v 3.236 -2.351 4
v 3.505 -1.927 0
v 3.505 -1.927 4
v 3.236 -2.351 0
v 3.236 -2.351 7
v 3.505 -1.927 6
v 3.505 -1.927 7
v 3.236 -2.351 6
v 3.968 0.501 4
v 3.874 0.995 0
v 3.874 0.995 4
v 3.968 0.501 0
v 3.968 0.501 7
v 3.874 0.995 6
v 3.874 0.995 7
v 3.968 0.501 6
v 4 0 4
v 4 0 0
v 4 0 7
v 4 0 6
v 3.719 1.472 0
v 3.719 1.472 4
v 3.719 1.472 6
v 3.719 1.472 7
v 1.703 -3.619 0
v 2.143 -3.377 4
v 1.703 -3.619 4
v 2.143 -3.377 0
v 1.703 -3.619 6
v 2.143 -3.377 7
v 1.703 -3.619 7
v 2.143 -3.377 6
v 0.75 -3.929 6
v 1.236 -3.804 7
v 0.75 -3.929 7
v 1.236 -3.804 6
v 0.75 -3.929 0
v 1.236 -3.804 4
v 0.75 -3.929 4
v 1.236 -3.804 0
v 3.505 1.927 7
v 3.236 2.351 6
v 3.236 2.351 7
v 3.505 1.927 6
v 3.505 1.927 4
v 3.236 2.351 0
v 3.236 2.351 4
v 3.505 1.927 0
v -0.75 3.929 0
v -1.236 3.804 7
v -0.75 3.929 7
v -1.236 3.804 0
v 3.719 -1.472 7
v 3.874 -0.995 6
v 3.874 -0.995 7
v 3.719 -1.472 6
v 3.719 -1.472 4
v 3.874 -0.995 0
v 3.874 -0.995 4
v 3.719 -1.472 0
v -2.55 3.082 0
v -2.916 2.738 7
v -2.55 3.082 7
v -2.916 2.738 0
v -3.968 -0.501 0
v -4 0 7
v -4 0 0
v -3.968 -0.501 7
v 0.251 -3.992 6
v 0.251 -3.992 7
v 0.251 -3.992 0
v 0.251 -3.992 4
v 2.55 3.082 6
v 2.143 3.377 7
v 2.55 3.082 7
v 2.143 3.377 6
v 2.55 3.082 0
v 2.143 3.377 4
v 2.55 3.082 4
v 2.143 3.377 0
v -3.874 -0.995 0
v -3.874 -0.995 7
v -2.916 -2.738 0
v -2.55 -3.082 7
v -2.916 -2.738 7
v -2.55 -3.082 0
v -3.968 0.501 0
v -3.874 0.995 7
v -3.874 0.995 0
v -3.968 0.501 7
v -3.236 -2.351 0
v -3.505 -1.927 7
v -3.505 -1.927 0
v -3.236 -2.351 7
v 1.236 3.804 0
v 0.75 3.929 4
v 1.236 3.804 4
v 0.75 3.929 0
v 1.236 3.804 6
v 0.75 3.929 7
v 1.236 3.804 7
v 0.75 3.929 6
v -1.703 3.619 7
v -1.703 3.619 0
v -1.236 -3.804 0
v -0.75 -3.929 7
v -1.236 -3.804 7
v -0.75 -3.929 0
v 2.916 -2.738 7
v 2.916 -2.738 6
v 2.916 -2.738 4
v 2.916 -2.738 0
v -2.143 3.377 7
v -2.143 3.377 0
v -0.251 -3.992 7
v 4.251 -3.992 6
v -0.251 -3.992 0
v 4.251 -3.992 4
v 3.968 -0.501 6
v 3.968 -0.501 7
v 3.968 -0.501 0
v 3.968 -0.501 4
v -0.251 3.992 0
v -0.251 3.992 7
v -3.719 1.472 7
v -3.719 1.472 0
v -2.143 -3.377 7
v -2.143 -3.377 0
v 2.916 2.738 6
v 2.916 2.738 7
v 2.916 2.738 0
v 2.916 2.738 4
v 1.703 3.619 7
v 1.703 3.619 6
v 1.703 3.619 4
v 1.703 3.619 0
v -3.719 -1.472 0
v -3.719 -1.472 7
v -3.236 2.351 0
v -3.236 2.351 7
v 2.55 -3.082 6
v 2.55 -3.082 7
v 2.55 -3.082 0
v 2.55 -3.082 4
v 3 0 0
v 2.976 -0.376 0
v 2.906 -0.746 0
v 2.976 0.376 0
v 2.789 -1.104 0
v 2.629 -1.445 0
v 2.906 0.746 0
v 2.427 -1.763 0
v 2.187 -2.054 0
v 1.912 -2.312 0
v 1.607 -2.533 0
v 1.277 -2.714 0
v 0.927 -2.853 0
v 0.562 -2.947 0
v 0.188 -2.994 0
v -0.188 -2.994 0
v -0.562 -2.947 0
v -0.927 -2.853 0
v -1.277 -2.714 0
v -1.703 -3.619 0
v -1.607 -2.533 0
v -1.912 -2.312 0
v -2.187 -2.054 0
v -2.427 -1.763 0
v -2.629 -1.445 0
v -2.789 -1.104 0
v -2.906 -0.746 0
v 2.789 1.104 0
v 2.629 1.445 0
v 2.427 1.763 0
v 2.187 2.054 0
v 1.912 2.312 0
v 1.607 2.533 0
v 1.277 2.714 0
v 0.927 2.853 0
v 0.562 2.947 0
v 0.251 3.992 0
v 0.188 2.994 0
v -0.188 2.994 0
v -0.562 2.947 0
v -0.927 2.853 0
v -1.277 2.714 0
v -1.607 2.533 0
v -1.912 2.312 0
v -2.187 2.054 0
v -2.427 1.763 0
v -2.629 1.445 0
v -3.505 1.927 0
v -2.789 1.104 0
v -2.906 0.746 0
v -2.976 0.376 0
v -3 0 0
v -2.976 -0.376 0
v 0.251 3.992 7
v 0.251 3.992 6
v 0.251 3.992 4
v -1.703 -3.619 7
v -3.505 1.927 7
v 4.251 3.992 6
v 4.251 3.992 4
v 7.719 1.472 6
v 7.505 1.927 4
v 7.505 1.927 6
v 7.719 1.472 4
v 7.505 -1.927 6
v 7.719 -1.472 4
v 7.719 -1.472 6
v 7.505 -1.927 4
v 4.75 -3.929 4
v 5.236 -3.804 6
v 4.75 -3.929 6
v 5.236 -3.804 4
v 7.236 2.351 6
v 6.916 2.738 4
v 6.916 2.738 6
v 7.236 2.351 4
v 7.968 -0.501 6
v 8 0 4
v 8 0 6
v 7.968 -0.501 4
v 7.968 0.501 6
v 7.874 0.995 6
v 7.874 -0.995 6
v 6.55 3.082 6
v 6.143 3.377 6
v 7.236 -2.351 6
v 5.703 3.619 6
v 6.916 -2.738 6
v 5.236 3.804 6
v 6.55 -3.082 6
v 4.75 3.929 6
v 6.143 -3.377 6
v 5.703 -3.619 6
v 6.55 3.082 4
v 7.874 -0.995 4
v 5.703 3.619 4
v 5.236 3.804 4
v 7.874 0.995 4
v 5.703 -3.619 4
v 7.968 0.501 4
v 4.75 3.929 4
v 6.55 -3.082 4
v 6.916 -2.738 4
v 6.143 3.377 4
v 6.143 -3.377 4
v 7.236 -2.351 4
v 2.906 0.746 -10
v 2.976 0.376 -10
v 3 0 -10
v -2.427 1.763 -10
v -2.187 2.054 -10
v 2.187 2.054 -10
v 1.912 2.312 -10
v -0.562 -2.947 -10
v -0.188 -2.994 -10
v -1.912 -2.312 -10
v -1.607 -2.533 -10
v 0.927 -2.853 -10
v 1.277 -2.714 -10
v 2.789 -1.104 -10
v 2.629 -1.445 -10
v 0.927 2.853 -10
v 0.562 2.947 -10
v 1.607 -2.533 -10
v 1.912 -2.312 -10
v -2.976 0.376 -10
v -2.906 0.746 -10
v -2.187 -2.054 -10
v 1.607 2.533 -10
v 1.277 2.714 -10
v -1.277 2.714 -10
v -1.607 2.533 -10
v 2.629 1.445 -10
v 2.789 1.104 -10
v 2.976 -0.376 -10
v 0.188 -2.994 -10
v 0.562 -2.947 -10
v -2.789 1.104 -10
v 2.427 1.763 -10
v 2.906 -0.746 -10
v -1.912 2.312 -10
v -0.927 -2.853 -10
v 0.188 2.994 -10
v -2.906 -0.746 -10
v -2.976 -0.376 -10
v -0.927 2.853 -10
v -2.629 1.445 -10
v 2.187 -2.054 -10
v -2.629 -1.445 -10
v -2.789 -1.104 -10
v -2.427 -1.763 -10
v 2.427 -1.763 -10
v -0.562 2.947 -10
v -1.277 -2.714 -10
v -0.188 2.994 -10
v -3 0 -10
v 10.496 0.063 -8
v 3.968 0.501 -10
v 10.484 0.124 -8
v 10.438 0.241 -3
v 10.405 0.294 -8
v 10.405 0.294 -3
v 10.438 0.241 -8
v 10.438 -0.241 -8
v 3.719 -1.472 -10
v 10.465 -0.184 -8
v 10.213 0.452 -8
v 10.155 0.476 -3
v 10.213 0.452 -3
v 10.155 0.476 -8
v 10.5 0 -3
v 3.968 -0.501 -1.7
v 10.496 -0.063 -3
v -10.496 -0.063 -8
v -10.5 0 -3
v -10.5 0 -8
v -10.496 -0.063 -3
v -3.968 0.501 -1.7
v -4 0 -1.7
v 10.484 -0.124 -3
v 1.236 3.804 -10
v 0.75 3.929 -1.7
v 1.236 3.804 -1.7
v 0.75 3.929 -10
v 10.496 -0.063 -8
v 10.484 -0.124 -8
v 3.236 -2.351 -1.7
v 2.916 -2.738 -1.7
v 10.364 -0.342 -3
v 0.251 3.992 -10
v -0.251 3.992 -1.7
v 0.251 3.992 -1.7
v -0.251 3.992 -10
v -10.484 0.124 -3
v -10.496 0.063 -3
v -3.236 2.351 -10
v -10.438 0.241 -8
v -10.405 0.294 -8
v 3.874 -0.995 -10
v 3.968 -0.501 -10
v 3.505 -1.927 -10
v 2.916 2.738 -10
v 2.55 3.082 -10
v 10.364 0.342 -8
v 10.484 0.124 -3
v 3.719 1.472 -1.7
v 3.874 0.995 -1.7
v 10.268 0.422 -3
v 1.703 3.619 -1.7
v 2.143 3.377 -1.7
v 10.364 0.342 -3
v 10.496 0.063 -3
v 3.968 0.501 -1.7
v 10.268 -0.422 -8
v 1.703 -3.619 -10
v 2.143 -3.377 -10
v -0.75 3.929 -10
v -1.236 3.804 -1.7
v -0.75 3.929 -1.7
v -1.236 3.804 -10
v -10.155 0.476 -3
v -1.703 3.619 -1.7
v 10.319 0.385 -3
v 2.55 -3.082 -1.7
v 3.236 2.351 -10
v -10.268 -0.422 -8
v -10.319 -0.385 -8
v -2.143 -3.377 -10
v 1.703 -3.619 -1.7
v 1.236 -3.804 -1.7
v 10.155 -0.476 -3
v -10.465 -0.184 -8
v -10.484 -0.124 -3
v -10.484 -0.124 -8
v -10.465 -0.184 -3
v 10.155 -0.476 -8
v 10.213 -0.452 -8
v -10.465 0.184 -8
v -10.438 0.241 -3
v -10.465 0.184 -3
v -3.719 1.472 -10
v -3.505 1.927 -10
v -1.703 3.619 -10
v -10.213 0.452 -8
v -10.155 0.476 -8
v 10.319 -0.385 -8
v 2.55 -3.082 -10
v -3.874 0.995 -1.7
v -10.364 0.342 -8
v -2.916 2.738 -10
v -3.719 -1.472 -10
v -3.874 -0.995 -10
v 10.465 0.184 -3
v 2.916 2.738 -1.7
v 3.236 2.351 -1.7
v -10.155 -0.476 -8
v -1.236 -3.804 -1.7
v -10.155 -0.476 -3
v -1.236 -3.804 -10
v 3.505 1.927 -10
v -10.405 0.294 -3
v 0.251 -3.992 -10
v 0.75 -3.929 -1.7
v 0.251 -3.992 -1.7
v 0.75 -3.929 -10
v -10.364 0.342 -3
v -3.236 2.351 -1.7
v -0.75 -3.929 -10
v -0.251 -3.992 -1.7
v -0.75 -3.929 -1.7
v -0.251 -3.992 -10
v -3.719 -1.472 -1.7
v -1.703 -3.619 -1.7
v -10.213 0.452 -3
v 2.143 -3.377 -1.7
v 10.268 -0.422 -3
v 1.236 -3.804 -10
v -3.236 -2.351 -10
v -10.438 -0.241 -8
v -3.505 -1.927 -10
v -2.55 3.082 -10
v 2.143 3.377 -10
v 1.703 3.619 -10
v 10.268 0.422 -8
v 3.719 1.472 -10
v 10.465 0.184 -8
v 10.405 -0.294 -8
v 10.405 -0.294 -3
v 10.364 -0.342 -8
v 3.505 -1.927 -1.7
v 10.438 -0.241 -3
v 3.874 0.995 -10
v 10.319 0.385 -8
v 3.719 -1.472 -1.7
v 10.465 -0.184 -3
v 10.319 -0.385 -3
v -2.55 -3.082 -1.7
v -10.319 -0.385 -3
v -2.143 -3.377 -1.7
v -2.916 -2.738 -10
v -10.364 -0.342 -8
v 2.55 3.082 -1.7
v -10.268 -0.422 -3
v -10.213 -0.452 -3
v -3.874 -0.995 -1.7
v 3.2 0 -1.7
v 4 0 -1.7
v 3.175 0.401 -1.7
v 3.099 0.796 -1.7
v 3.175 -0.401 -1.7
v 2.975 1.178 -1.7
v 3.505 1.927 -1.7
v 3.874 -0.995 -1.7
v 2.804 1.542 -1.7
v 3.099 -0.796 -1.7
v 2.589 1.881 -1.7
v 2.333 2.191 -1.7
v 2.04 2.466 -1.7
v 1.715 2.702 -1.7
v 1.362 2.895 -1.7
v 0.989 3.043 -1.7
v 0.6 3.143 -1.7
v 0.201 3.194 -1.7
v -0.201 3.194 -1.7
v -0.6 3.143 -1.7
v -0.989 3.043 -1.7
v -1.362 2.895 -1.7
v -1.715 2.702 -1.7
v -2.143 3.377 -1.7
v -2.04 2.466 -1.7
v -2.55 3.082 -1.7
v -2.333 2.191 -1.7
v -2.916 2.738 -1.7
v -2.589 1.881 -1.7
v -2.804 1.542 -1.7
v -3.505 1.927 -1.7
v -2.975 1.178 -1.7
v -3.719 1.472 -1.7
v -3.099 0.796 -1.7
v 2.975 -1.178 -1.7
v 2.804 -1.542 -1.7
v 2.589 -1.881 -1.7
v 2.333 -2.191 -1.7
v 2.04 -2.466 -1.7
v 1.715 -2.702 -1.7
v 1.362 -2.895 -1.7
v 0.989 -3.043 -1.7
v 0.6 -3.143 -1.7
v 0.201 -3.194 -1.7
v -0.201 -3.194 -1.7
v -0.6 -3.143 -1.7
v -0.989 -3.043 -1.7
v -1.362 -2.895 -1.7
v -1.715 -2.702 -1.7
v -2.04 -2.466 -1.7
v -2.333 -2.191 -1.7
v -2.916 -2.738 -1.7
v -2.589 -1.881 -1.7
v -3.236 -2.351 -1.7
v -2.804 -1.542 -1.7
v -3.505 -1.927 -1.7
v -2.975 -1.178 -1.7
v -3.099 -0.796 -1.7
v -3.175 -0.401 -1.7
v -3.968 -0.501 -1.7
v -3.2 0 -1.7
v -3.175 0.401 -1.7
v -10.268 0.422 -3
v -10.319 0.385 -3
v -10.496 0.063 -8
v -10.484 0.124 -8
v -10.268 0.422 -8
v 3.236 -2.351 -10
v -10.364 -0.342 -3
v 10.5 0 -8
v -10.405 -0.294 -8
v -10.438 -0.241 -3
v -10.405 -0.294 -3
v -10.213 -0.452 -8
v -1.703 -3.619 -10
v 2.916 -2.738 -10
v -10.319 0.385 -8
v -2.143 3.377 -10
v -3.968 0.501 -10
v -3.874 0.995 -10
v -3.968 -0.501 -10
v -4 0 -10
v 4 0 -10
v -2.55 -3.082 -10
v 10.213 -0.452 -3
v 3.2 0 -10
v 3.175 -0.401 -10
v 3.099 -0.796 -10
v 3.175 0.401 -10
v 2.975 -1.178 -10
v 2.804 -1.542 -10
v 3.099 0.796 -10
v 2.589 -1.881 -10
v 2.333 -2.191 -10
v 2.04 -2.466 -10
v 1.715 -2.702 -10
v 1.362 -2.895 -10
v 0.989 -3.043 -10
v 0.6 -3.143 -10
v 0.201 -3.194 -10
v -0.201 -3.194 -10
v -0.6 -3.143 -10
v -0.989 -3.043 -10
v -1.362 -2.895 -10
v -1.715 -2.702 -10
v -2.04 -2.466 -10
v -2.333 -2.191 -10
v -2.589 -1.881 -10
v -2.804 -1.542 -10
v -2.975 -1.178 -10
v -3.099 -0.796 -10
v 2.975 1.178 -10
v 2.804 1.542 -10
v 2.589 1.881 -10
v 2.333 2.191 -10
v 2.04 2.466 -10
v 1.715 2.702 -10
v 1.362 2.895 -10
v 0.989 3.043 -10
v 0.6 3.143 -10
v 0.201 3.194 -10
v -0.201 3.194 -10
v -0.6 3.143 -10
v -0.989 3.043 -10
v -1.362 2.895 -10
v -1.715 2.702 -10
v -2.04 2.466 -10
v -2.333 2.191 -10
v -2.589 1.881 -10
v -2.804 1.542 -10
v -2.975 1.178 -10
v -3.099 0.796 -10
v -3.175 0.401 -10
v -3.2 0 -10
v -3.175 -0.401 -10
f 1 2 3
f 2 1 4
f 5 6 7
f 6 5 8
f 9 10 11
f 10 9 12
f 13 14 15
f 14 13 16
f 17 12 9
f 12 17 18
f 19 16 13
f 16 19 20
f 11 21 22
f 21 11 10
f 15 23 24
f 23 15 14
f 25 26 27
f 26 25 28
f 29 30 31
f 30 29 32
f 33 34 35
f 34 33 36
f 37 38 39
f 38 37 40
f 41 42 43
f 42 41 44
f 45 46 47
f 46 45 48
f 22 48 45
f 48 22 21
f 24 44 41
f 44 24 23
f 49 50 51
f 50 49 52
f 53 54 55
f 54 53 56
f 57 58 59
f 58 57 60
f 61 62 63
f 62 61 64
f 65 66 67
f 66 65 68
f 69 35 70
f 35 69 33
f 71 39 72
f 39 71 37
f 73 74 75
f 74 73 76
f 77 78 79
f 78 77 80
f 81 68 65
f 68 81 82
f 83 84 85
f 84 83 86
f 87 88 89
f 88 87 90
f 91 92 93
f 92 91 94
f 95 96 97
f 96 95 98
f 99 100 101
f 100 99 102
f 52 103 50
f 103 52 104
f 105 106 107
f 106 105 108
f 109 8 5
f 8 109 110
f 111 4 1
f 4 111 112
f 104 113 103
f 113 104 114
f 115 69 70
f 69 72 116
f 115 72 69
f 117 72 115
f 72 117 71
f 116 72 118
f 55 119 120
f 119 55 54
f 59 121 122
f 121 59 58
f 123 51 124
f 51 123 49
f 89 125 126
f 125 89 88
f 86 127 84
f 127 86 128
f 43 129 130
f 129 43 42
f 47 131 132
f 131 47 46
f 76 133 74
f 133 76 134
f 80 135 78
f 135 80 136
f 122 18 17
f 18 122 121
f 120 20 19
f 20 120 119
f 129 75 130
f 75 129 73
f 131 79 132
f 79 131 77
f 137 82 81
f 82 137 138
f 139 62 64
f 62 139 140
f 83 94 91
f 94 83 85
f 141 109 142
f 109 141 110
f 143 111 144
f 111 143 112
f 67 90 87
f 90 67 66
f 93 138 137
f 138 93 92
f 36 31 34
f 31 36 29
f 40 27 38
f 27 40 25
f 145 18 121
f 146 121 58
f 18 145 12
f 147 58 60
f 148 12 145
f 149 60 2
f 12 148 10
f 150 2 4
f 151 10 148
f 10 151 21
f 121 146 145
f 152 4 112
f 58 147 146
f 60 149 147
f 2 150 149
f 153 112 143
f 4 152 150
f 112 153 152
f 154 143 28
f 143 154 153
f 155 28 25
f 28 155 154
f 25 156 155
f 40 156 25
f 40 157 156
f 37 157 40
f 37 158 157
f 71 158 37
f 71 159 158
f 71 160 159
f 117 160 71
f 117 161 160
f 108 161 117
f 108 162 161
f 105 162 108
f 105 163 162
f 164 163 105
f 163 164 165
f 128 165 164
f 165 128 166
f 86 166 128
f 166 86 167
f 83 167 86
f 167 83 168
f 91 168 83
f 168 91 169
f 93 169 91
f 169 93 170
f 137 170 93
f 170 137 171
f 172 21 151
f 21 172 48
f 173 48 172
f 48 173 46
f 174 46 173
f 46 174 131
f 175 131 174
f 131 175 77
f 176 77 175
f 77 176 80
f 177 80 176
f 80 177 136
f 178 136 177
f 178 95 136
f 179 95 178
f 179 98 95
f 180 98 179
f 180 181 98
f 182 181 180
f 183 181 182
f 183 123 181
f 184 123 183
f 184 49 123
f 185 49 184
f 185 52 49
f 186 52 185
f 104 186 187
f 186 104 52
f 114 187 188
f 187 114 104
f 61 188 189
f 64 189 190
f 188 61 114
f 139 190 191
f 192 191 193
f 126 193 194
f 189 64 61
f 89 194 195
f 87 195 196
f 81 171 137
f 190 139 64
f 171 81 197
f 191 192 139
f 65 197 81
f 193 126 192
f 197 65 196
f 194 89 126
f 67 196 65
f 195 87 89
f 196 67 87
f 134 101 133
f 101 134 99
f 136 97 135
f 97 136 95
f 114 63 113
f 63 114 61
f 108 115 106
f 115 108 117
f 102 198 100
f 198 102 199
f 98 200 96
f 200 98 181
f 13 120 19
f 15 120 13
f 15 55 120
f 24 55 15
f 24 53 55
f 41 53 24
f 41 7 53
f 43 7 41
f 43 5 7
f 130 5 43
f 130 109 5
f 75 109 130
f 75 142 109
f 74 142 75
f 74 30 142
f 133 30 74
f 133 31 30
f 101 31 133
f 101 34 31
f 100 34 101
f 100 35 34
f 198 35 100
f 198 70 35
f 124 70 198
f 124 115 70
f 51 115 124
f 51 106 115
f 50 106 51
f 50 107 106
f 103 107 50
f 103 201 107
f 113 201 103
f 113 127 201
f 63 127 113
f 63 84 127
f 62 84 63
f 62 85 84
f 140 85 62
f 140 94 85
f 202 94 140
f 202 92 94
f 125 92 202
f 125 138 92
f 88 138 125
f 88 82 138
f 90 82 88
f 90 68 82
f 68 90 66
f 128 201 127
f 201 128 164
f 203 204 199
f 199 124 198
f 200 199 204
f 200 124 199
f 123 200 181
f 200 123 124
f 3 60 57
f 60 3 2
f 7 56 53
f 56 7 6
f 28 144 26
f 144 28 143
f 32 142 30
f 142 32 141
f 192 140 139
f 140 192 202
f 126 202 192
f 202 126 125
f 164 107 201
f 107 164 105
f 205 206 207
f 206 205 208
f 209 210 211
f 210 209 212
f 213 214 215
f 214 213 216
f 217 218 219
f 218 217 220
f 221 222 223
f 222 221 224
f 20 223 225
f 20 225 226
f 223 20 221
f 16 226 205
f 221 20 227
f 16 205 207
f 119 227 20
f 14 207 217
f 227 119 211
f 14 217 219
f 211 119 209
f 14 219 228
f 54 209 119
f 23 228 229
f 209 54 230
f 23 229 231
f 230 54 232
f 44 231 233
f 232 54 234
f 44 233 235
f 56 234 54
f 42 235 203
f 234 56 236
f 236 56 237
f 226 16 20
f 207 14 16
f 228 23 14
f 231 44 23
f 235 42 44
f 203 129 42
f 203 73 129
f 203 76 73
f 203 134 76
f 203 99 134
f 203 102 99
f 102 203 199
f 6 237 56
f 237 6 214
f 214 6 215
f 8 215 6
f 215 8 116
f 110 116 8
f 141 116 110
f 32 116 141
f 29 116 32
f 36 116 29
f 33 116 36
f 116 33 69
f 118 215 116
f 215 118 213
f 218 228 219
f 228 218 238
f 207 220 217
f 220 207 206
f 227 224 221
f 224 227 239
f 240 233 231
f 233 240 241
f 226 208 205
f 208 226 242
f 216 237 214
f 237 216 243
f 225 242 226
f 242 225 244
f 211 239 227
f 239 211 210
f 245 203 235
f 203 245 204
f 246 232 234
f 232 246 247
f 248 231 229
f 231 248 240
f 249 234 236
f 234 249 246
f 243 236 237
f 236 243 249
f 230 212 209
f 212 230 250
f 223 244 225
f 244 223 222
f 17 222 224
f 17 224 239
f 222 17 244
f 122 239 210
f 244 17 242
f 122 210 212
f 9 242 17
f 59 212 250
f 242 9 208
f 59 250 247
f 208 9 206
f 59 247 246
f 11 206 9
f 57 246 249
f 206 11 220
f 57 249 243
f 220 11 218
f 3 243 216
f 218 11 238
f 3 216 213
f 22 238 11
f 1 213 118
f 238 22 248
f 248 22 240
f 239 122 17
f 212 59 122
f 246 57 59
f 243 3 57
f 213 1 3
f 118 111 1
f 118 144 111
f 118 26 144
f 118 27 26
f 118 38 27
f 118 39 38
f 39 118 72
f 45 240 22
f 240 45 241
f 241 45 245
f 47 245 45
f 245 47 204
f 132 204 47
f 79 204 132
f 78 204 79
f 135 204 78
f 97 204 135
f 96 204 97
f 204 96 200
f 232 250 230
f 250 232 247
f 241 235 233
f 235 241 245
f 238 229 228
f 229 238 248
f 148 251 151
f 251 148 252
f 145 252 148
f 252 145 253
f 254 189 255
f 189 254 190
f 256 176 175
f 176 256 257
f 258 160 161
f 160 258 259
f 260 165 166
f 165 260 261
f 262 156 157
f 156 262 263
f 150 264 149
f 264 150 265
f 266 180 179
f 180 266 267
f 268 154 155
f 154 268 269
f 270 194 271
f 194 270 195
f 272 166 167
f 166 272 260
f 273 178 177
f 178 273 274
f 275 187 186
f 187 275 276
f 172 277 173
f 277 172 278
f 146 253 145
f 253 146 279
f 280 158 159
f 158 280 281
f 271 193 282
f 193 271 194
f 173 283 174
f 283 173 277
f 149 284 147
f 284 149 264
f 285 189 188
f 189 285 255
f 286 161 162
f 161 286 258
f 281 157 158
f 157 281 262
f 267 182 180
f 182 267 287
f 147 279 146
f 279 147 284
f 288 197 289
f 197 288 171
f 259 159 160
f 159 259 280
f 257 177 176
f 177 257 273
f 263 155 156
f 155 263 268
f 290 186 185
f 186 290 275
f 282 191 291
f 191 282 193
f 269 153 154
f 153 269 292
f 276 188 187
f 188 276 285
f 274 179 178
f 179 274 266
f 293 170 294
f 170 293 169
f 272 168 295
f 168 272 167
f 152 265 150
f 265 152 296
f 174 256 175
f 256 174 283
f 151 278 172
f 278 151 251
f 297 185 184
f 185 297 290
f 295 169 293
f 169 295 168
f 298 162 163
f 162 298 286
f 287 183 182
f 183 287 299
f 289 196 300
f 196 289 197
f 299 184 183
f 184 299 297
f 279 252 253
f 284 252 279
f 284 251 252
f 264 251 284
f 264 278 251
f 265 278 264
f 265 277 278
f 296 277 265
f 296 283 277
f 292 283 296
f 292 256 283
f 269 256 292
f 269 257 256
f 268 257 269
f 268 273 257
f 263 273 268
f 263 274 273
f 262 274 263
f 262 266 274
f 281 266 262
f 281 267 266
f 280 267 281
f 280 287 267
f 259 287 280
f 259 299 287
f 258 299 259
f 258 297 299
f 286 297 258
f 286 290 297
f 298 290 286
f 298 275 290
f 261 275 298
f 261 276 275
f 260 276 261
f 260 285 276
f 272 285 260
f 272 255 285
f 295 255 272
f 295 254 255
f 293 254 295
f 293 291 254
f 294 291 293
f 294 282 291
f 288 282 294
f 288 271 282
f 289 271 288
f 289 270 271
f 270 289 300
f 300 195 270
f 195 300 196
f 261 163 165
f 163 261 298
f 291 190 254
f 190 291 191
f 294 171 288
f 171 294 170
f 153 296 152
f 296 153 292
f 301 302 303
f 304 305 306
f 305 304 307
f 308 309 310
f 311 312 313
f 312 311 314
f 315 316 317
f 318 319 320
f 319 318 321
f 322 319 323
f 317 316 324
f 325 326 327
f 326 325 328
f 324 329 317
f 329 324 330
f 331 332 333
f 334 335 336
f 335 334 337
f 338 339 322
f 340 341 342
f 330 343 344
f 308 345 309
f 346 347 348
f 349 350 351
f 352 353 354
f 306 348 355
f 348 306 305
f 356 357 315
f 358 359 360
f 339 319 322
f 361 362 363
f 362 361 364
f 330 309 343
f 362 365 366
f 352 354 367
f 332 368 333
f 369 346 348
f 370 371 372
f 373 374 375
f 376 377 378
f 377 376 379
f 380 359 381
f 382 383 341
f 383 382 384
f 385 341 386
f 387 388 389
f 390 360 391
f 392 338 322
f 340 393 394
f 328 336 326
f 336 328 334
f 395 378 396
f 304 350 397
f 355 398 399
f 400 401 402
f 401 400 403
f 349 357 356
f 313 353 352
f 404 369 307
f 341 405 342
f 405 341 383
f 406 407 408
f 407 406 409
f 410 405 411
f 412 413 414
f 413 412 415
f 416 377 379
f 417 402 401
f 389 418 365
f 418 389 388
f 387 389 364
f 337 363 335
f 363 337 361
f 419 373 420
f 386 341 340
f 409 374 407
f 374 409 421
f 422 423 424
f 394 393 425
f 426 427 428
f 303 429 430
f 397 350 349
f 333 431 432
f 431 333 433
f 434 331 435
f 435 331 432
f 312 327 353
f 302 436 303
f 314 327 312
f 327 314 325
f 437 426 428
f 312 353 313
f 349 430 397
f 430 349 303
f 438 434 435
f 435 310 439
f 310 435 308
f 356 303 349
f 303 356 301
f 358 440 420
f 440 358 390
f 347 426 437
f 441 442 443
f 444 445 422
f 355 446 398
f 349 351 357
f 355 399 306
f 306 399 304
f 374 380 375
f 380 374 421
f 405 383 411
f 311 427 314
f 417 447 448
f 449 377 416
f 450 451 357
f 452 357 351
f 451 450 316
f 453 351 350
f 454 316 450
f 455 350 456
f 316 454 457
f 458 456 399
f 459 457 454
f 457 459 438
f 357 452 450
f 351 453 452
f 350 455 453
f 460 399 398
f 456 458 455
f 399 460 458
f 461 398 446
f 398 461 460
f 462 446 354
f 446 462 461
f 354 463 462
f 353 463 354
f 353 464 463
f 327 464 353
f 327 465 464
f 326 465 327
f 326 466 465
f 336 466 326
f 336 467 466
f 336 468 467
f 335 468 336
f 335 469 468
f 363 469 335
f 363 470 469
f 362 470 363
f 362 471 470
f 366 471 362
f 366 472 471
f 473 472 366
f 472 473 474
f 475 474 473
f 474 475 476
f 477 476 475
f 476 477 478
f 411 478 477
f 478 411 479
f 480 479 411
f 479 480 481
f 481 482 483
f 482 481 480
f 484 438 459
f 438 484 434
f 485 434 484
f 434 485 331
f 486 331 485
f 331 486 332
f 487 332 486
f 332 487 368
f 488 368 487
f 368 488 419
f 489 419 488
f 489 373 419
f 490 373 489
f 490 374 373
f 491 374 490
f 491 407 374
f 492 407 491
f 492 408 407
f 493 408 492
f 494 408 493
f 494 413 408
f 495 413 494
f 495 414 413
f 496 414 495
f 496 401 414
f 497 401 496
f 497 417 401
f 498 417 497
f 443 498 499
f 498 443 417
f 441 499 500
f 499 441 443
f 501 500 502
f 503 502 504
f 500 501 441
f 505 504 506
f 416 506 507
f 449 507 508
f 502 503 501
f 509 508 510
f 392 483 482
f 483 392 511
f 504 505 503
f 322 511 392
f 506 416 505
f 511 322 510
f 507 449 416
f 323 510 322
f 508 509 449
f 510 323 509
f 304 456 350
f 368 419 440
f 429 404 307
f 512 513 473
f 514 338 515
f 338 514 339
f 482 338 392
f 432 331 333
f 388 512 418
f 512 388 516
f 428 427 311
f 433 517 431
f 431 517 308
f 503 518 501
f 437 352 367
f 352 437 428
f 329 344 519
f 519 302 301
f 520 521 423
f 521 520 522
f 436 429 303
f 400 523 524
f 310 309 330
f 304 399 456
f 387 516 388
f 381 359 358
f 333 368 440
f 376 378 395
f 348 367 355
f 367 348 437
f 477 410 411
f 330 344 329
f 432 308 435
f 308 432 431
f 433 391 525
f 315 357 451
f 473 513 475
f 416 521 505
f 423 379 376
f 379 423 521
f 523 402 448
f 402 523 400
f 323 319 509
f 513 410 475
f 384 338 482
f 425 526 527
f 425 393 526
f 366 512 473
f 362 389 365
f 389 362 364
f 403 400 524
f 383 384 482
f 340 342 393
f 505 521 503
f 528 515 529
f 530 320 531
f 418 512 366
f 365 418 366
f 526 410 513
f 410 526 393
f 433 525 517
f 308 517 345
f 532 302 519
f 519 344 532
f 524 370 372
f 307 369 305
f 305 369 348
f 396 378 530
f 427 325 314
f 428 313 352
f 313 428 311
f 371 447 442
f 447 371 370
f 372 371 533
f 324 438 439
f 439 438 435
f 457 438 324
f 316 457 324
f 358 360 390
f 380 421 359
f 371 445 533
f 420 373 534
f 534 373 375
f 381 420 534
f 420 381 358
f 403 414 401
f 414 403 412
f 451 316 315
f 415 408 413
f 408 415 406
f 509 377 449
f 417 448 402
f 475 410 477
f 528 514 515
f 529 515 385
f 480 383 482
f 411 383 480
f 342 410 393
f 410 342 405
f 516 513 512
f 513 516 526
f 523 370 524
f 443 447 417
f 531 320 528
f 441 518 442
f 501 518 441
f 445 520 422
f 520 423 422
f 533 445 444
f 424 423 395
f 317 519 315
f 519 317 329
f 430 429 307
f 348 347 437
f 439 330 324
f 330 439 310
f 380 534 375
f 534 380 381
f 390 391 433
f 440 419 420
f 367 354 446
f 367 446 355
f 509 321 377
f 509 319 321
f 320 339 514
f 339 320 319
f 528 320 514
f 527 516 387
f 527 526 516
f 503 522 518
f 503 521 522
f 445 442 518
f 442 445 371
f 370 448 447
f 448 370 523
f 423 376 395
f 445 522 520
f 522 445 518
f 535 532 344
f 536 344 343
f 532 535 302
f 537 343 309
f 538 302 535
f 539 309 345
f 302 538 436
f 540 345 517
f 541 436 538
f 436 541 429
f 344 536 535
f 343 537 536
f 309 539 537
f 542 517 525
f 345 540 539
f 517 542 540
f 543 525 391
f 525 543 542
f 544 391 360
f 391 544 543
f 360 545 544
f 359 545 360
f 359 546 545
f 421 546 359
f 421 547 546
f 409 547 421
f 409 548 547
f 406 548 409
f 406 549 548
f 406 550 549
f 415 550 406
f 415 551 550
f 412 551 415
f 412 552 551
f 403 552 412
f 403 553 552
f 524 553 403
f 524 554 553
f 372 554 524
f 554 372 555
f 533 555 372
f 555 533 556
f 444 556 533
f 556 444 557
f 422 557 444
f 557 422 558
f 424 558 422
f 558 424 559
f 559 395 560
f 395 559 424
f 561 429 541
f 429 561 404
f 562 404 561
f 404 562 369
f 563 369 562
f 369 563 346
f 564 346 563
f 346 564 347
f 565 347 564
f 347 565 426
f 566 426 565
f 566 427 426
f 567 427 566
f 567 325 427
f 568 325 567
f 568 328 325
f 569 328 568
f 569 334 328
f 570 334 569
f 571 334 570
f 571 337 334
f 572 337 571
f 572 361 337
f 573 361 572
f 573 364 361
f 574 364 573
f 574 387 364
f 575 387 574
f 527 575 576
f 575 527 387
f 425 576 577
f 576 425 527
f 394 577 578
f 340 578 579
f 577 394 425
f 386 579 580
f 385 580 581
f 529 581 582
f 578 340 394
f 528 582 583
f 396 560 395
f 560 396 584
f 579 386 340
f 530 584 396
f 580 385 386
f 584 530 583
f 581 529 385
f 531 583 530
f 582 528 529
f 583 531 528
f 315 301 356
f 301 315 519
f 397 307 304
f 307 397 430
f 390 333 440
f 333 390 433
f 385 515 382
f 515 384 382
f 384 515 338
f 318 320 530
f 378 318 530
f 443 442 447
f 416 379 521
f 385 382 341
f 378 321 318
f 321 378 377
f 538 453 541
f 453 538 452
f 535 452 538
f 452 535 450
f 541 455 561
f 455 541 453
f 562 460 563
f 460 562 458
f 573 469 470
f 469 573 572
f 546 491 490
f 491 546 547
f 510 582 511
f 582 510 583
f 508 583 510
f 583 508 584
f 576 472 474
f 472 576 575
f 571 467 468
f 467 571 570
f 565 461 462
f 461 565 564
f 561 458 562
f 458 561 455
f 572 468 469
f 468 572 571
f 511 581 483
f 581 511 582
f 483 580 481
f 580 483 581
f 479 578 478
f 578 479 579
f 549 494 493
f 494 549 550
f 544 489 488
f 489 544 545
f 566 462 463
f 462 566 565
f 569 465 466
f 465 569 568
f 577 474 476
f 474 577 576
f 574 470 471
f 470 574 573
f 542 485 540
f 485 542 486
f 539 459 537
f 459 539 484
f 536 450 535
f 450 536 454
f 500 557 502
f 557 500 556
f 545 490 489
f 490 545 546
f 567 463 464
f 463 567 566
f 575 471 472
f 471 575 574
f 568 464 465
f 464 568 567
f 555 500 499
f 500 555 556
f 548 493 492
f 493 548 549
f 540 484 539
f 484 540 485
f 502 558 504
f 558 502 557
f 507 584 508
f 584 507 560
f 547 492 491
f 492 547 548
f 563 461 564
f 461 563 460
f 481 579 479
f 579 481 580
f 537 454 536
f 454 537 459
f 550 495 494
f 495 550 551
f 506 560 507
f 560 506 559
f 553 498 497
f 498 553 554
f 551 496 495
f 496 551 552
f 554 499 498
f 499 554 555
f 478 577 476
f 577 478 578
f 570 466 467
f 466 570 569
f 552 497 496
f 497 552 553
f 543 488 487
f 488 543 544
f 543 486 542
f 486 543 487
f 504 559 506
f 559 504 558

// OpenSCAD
// file: ../planelib/ruder.scad
module RuderAdd3() // elements to ruder
{
   p0 = [-ptRuder.x * s[ruderseg] + o[ruderseg].x, o[ruderseg].z];
   p1 = [-ptRuder.x * s[ruderseg+1] + o[ruderseg+1].x, o[ruderseg+1].z];
   p2 = [-s[ruderseg+1] + o[ruderseg+1].x, o[ruderseg+1].z];
   p3 = [-s[ruderseg] + o[ruderseg].x, o[ruderseg].z];
   d0 = hRuder * s[ruderseg];
   d1 = hRuder * s[ruderseg+1];

   intersection(){
       union(){
           hull(){ // drehachse
                translate([p0.x, ptRuder.y*s[ruderseg] ,p0.y])
                cylinder(d=d0,h=0.01);
               translate([p1.x, ptRuder.y*s[ruderseg+1] ,p1.y])
                cylinder(d=d1,h=0.01);
                }

            // schnitt an der achse
           translate([0, 50/2, 0])
           rotate([90,0,0])
           linear_extrude(height=50)
           polygon([p0,p1,p2,p3]);
           }
       difference(){
           segment([s[ruderseg],s[ruderseg+1]], [o[ruderseg],o[ruderseg+1]], r=0);
           wingPolyLine( d=dPoly, pt=ptRuder, off=[+0,+0] );
           translate([0, 50/2, 0])
           rotate([90,0,0])
           linear_extrude(height=50)
           polygon([p1+[(d1+1)/2,-1],p1+[(d1+1)/2,0], p2, p2+[0,-1]]);
           }
       RuderDiff2Mask();
       }
}

module RuderAdd2() // add elements to sement
{
   p0 = [-ptRuder.x * s[ruderseg] + o[ruderseg].x, o[ruderseg].z];
   p1 = [-ptRuder.x * s[ruderseg+1] + o[ruderseg+1].x, o[ruderseg+1].z];
   p2 = [-s[ruderseg+1] + o[ruderseg+1].x, o[ruderseg+1].z];
   p3 = [-s[ruderseg] + o[ruderseg].x, o[ruderseg].z];
   p4 = [+ o[ruderseg+1].x, o[ruderseg+1].z];
   p5 = [+ o[ruderseg].x, o[ruderseg].z];
   d0 = hRuder * s[ruderseg];
   d1 = hRuder * s[ruderseg+1];

   intersection(){
       union(){
           hull(){ // drehachse
                translate([p0.x, ptRuder.y*s[ruderseg] ,p0.y])
                cylinder(d=d0,h=0.01);
               translate([p1.x, ptRuder.y*s[ruderseg+1] ,p1.y])
                cylinder(d=d1,h=0.01);
                }

            // schnitt an der achse
           translate([0, 50/2, 0])
           rotate([90,0,0])
           linear_extrude(height=50)
           polygon([p0,p1,p4,p5]);
           }
       difference(){
           segment([s[ruderseg],s[ruderseg+1]], [o[ruderseg],o[ruderseg+1]], r=0);
           wingPolyLine( d=dPoly, pt=ptRuder, off=[+0,+0] );
           translate([0, 50/2, 0])
           rotate([90,0,0])
           linear_extrude(height=50)
           *polygon([p1+[(d1+1)/2,-1],p1+[(d1+1)/2,0], p2, p2+[0,-1]]);
           }
       RuderDiff2MaskInv();
       }
}

module RuderCut2() // cut the ruder from segmen
{
   p0 = [-ptRuder.x * s[ruderseg] + o[ruderseg].x, o[ruderseg].z];
   p1 = [-ptRuder.x * s[ruderseg+1] + o[ruderseg+1].x, o[ruderseg+1].z];
   p2 = [-s[ruderseg+1] + o[ruderseg+1].x, o[ruderseg+1].z];
   p3 = [-s[ruderseg] + o[ruderseg].x, o[ruderseg].z];
   d0 = hRuder * s[ruderseg];
   d1 = hRuder * s[ruderseg+1];

    // schnitt an der achse
   translate([0, 50/2, 0])
    rotate([90,0,0])
     linear_extrude(height=50)
      polygon([p0,p1,p2,p3]);
   RuderDiff2Axis( rot = 400, doff=-0.5 );
}

module RuderCut3() // cut the segment from the ruder
{
   p0 = [-ptRuder.x * s[ruderseg] + o[ruderseg].x, o[ruderseg].z];
   p1 = [-ptRuder.x * s[ruderseg+1] + o[ruderseg+1].x, o[ruderseg+1].z];
   p2 = [-s[ruderseg+1] + o[ruderseg+1].x, o[ruderseg+1].z];
   p3 = [-s[ruderseg] + o[ruderseg].x, o[ruderseg].z];
   p4 = [+ o[ruderseg+1].x, o[ruderseg+1].z];
   p5 = [+ o[ruderseg].x, o[ruderseg].z];
   d0 = hRuder * s[ruderseg];
   d1 = hRuder * s[ruderseg+1];

    // schnitt an der achse
   translate([0, 50/2, 0])
    rotate([90,0,0])
     linear_extrude(height=50)
      polygon([p0,p1,p4,p5]);
   RuderDiff2Axis( rot = 400, doff=-0.5 );
}

module RuderDiff2( doff = 0.5 ) // cut element from segment
{
   intersection(){
        RuderDiff2Axis( rot = 0, doff=0 );
        RuderDiff2Mask( doff=0 );
        }
   RuderDiff2Axis( rot = 0, doff = -doff );
}

module RuderDiff3( doff = 0.5 ) // cut elements from ruder
{
    difference(){
        RuderDiff2Axis( rot = 180, doff=0 );
        RuderDiff2Mask( doff = +doff );
        }
    RuderDiff2Axis( rot = 180, doff = -doff );
    translate([-s[ruderseg],-50,0]+o[ruderseg]) cube( [100,100,doff], center=false );
    translate([-s[ruderseg+1],-50,-doff]+o[ruderseg+1]) cube( [100,100,doff], center=false );
    
   
}


module RuderDiff2Mask( doff = 0.5 )
{   //todo: this has to depend on o,s...
    translate([-150,0,50]+o[ruderseg]) cube( [100,50,50-doff], center=true );
    translate([-150,0,150]+o[ruderseg]) cube( [100,50,50-doff], center=true );
}
module RuderDiff2MaskInv( doff = 0.5 )
{   //todo: this has to depend on o,s...
    translate([-170,0,0]+o[ruderseg]) cube( [100,50,50-doff], center=true );
    translate([-160,0,100]+o[ruderseg]) cube( [100,50,50-doff], center=true );
    translate([-150,0,200]+o[ruderseg]) cube( [100,50,50-doff], center=true );
}

// axis with rotation limits used as mask
module RuderDiff2Axis( rot=0, doff=0 )
{
   p0 = [-ptRuder.x * s[ruderseg] + o[ruderseg].x, o[ruderseg].z];
   p1 = [-ptRuder.x * s[ruderseg+1] + o[ruderseg+1].x, o[ruderseg+1].z];
   d0 = hRuder * s[ruderseg] - doff;
   d1 = hRuder * s[ruderseg+1] - doff;
   w = 40; // max ruder angle

   
  hull(){ 
    translate([p0.x, ptRuder.y*s[ruderseg] ,p0.y]) {
        cylinder( d=d0, h=0.01, center=false );
        if( rot < 360 ){
            rotate([0,0,rot+w]) translate([-2*d0,-d0/2,0]) cube([2*d0, d0, 0.01], center=false );
            rotate([0,0,rot-w]) translate([-2*d0,-d0/2,0]) cube([2*d0, d0, 0.01], center=false );
            }
        }
    translate([p1.x, ptRuder.y*s[ruderseg+1] ,p1.y]) {
        cylinder( d=d1, h=0.01, center=false );
        if( rot < 360 ){
            rotate([0,0,rot+w]) translate([-2*d1,-d1/2,0]) cube([2*d1, d1, 0.01], center=false );
            rotate([0,0,rot-w]) translate([-2*d1,-d1/2,0]) cube([2*d1, d1, 0.01], center=false );
            }
        }
    }
}

module RuderHorn()
{

    p0 = [-ptRuder.x * s[ruderseg] + o[ruderseg].x, o[ruderseg].z];
    p1 = [-ptRuder.x * s[ruderseg+1] + o[ruderseg+1].x, o[ruderseg+1].z];
    pm = (p0 + p1)/2;
    sm = (s[ruderseg]+s[ruderseg+1])/2;

    translate([pm.x,ptRuder.y*sm ,pm.y + 24 ])
    rotate([0,ruderrot, 2])
    difference()
    {
        hull()
        {
            translate([-5,2,0]) cylinder(d=2,h=4);
            translate([2,12,0]) cylinder(d=6,h=2);
            translate([-20,0,0]) cylinder(d=2,h=4);
        }
        translate([2,12,0]) cylinder(d=1.5,h=2);
   }
}
// file: ../planelib/servo.scad
servo_size_1 = [25.5,12,37];  // mg90s
servo_size_2 = [33.5,12,3];

*servo_sg90($fn=50);

module servo_sg90()
{
        cube( servo_size_1, center=true );
        translate([0,0,3.5]) 
            cube( servo_size_2, center=true );
        // servoarm...
        translate([-5,6,17])
        resize([60,12,6])
        sphere( d=1 );
}
    

module ServoDiff( i=ruderseg, sy=7 )
{ 
    sx = s[i]*(tubeOffset1+tubeOffset2)/2;  // between the tubes
    sz = (o[i+1].z-o[i].z)/2;   // in the middle of the segment
    translate( o[i] + [-sx, sy, sz])
            rotate([0,ruderrot, 2])
                servo_sg90();
                
    
    // kabelkanal
    *translate( o[i] + [-sx+10, +11-2-2, hz/2-13])
            rotate([0,90,4])
                cube([12,5,10]);
}
// file: ../planelib/polyline.scad
module wingPolyLine( d=3, pt=[0,0], off=[0,0]  )
{
    *echo(pt);
    l = len(s)-1; 
    poly = [         [o[0].x - s[0]*pt.x - off.x , o[0].y + s[0]*pt.y + off.y,  o[0].z - 20 ],
        for(i=[0:l]) [o[i].x - s[i]*pt.x - off.x , o[i].y + s[i]*pt.y + off.y,  o[i].z ],
                     [o[l].x - s[l]*pt.x - off.x , o[l].y + s[l]*pt.y + off.y,  o[l].z + 20 ] ];
    *echo( poly);
    for( i=[0:(len(poly)-2)] ){
        hull(){
            translate(poly[i]) 
                sphere( d=d );
            translate(poly[i+1]) 
                sphere( d=d );
            }
        }
}

module fusePolyLine( d=3, size=605, off=[0,0], p=pClarkFusePolyUp )
{
    for( i=[0:(len(p)-2)] ){
        hull(){
            translate([p[i].x*size, p[i].y*size+off.y, +off.x]) 
                sphere( d=d );
            translate([p[i+1].x*size, p[i+1].y*size+off.y, +off.x]) 
                sphere( d=d );
            }
        *echo( p[i] );
        }
}

module fusePolyLineQ( d=3, size=605, pt=[0,0], off=[0,0] )
{
    poly = [        
                    [o[1].x - s[1]*pt.x - off.x , o[1].y + s[1]*pt.y + off.y,  +o[1].z ],
                    [o[0].x - s[0]*pt.x - off.x , o[0].y + s[0]*pt.y + off.y,  +o[0].z ],
                    [o[0].x - s[0]*pt.x - off.x , o[0].y + s[0]*pt.y + off.y,  -o[0].z ], 
                    [o[1].x - s[1]*pt.x - off.x , o[1].y + s[1]*pt.y + off.y,  -o[1].z ]
                    ];
                    
        for( i=[0:(len(poly)-2)] ){
                hull(){
                    translate(poly[i]) 
                        sphere( d=d );
                    translate(poly[i+1]) 
                        sphere( d=d );
                    }
        }
}

module offsetPolyLine(  d=3, size=605, off=10, p=pClarkY )  // this does not yet work, just a test.
{
    for( i=[0:(len(p)-1)] ){
        po = size * p[i];
        pv = size * ((i>0) ? p[i-1] : p[len(p)-1]);
        pn = size * ((i>(len(p)-2)) ? p[0] : p[i+1]);

        pop = (pv + pn)/2 + po;
        p02 = pn - po;
        z = p02.x * pop.y + p02.y * pop.x;
        
        pt = sign( z ) * pop * (off/norm(pop));
       

        
        hull(){
            translate([po.x+pt.x, po.y+pt.y, 0]) 
                sphere( d=d );
            translate([pn.x+pt.x, pn.y+pt.y, 0]) 
                sphere( d=d );
            }
        echo( po, pop, z );
    }
}
// file: ../planelib/wing.scad
module segment( s, o, r=0, p=pSD6060, begin=0, end=1 )
{
    factor = ( s[1] ) / ( s[0] );
    height = ( o[1].z - o[0].z );
    sx = ( o[1].x - o[0].x ) / height;
    sy = ( o[1].y - o[0].y ) / height;
    
    m=[ [ 1, 0,  sx, 0],
        [ 0, 1,  sy, 0],
        [ 0, 0,  1,  0],
        [ 0, 0,  0,  1] ];
    
    translate(o[0])
        multmatrix(m)
            linear_extrude( height=height, scale=factor, convexity=10 ) 
                intersection()
                {
                    spant2d( s=s[0], r=r, p=p );
                    scale(s) 
                        mirror([1,0]) // vgl spant2d()
                            translate( [begin,-0.5] ) 
                                square( [(end-begin), 1] );
                }
}


module spant3d( d=0.3, offset=[0,0,0], size=100, r=0, p=pSD6060 )
{
    translate(offset) linear_extrude( d, convexity=10 ) spant2d(size,r,p);
}

module spant3dDiff( d=0.3, offset=[0,0,0], size=100, rot=[0,0,0], ra=0, ri=-2.5, p=pSD6060 )
{
    translate(offset) rotate(rot) translate([0,0,-d/2]) linear_extrude( height=d, convexity=10 )
    difference()
    {
        spant2d( s=size, r=ra, p=p );
        spant2d( s=size, r=ri, p=p );
    }
}

module spant2d(s=1, r=0, p=pSD6060 )
{
    offset(delta=r)
    //alternative: offset(r=r)
    scale(s)
    mirror([1,0])  // sollte das weg?
    polygon(p);
}
// file: ../planelib/skin.scad
module outerSkin( d=1, h=0, center=true )
{
    hgt = (h<=0) ? h : 2*d;
    difference(){
        minkowski(){
            children();
            cylinder(r=d,h=hgt,center=center ); 
        }
        children();
    }
}

module outerSkin2( d=1, h=0, center=true )
{
    hgt = (h<=0) ? h : 2*d;
    difference(){
        minkowski(){
            children(0);
            cylinder(r=d,h=hgt,center=center ); 
        }
        children(1);
    }
}

module innerSkin( )
{
    difference(){
        children(0);
        children(1);    
        }
}

module skin2()
{
    difference()
    {
        minkowski()
        {
            children(0);
            children(1);    
        }
        children(0);
    }
}

module Slice( )
{
    intersection()
    {
        children(0);
        children(1);
    }
}

module gridSlice( dy=30, angy=30, grid=2, dim=1000 )
{
    Slice(){
        children();
        for(z=[-dim:dy:dim], angy=[-angy,+angy])  
            translate([0,0,z])  
                rotate([0,angy,0])
                    cube([dim,dim,grid], center=true );
    }

}

module linearSlice( sh=100, sx=100, org=[0,0,0], rot=[0,0,0], center=true )
{
    Slice()
    {
        children();
        translate( org + [0,0,+sh/2] )
            rotate( rot )
                cube( [4*sx,2*sx,sh], center=center );
    }
}

module radialSlice( sh=100, sx=100, org=[0,0,0], rot=[0,0,0], mode=0, center=true )
{
    Steps = 120;
    Slice()
    {
        children();
        translate( org + [0,0,0] )
            rotate( rot )
                radialSliceHelper( d=2*sx, sh=sh, mode, center );
    }
}

module radialSliceHelper( d, sh, mode=0, center=true )
{
    gap = 0.5;
    
    if( mode==0 ){
        cylinder( d=d, h=sh, center=center );
        }
            
    if( mode==1 ){
        difference(){
            union(){
                cylinder( d=d, h=sh, center=center );
                for( r=[0:120:360] )
                    translate([0,0,0]) rotate([0,90,r]) cylinder( d=10, h=d, center=center );
                }
            union(){
                for( r=[0:120:360] )
                    translate([0,0,sh]) rotate([0,90,r]) cylinder( d=10+0.2, h=d, center=center );
                }
            }
        }
 //hier war der marker..       
    if( mode==2 ){
        cx=5;
        cy=d/10;
        difference(){
            union(){
                cylinder( d=d, h=sh, center=center );
                for( r=[0:90:360] )
                    translate([0,0,0]) rotate([0,90,r]) cube([cx,cy,d],center=false); // d is diameter, cx,cy is size
                }
            union(){
                for( r=[0:90:360] )
                    translate([0,0,sh]) 
                        rotate([0,90,r]) 
                            translate([-gap,-gap/2,0])
                                cube([cx+gap*2,cy+gap,d],center=false);
                }
            }
        }
}

module show( d = [10,10,10] )
{
    for( i=[0:$children-1] )
    {
    translate( i * d )
        children(i);
    }
}
// main file
include <../planelib/inspectoer.scad>

fuseCoverHook( true );
